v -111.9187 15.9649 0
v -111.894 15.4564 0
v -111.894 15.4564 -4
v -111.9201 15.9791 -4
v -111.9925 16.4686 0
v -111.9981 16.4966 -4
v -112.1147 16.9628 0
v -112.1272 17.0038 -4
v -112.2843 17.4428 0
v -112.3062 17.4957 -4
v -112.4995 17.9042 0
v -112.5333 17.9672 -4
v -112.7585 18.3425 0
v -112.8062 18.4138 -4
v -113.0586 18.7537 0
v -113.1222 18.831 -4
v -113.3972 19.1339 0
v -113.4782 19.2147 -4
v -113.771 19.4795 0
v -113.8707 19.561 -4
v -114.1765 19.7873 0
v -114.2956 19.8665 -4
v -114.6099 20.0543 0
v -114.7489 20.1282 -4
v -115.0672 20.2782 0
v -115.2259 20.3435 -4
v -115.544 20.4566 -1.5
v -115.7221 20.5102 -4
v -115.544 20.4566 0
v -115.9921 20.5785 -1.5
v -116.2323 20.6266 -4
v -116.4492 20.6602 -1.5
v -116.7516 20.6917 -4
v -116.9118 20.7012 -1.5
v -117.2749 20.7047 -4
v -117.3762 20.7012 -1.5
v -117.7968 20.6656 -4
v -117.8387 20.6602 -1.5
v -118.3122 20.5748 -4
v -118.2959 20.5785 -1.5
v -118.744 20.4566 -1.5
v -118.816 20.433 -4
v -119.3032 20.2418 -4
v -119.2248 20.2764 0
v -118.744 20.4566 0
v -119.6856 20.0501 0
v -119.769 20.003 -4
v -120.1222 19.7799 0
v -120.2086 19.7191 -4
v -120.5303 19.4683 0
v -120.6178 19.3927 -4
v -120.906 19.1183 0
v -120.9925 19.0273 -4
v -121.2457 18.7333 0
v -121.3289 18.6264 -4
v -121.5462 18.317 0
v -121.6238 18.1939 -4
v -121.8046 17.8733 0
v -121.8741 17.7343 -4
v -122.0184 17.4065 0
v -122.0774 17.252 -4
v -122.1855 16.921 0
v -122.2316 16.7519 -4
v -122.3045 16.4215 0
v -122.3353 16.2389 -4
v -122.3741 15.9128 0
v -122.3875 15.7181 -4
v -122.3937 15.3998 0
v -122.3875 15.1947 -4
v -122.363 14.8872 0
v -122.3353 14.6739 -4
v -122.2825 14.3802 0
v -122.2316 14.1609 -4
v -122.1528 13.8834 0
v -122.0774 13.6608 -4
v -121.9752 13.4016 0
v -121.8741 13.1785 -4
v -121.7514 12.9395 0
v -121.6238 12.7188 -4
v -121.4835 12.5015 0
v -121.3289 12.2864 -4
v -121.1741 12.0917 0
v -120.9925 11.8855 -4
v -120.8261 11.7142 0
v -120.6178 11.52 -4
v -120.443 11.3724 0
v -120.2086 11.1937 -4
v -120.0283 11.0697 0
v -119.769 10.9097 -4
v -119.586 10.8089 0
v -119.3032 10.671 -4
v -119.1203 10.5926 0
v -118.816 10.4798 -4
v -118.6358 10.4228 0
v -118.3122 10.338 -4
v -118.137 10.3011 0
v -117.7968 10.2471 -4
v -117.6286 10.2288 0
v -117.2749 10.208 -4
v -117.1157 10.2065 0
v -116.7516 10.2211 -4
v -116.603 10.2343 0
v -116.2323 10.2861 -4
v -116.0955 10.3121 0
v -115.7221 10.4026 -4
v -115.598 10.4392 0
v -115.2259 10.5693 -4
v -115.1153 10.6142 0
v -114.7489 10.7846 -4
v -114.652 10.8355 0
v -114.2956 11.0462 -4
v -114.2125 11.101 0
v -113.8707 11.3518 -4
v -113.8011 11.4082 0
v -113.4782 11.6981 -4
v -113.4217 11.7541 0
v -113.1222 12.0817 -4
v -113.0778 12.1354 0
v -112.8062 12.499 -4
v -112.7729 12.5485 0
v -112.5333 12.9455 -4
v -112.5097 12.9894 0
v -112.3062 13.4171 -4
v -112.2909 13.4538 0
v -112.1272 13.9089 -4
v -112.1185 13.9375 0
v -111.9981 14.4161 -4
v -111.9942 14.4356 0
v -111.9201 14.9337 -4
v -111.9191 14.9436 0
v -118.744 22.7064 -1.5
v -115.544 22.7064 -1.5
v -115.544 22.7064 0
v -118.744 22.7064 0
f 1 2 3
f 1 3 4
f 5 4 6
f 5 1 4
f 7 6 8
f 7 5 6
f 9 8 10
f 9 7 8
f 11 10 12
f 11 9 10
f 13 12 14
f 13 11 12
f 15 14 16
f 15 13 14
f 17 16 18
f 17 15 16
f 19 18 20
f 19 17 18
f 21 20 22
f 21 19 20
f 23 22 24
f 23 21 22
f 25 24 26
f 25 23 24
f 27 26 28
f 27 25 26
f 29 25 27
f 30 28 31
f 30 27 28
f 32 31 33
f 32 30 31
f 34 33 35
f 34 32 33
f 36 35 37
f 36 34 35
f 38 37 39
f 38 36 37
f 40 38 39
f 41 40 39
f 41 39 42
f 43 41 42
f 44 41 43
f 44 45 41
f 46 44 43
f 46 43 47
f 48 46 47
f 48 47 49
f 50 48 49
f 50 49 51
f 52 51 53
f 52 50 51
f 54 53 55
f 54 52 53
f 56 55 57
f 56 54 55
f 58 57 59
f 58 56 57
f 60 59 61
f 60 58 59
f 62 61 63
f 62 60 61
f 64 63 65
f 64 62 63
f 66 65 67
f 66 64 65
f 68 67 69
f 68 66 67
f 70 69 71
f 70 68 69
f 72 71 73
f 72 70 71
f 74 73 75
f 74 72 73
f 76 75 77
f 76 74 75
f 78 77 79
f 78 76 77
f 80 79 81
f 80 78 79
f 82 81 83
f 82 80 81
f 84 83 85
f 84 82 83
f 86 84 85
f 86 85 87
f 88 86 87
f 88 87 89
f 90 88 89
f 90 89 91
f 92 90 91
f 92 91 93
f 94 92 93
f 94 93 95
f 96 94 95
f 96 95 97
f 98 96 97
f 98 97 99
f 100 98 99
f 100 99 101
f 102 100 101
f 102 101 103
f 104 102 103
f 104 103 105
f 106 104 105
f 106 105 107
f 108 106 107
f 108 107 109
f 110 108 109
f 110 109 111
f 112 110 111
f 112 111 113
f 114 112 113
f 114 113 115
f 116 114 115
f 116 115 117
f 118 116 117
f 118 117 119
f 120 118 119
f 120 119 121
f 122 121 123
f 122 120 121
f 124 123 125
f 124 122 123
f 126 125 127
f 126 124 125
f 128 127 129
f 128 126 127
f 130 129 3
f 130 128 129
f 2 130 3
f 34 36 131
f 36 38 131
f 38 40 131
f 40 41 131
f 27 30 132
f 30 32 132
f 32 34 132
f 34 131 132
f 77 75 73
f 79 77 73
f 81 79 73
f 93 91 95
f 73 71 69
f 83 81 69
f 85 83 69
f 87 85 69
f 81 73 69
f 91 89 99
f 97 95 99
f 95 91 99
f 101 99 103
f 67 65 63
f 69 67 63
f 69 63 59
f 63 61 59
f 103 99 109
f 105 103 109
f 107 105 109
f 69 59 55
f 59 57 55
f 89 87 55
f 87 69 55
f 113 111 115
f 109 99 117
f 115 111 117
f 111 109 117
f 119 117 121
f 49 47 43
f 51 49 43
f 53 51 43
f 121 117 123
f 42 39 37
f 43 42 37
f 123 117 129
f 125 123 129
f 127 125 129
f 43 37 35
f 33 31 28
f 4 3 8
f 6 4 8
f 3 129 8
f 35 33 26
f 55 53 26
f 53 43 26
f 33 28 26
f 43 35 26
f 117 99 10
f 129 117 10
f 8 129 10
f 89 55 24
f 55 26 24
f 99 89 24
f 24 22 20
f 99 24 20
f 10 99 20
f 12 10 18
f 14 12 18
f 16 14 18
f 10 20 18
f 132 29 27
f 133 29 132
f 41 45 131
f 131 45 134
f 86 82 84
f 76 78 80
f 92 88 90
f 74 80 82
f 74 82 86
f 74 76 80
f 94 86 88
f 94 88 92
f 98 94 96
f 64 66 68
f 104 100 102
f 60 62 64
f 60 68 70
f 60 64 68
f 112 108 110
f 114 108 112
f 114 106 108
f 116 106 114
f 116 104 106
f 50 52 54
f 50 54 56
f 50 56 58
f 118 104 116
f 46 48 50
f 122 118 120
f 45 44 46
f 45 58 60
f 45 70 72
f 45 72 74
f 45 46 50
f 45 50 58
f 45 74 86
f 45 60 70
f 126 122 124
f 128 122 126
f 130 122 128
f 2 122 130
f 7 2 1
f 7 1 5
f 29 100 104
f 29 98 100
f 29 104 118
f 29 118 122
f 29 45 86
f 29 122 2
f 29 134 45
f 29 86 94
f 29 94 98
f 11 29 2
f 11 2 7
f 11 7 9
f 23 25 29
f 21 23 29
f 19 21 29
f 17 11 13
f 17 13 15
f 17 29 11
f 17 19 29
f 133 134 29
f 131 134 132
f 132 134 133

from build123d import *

# Parameters (mm, degrees)
SKIZZE1_R                       = 5.25
AUFSATZ_LINEAR_AUSTRAGEN1_DEPTH = 4
SKIZZE2_W                       = 3.2
SKIZZE2_H                       = 7.25
AUFSATZ_LINEAR_AUSTRAGEN2_DEPTH = 1.5


with BuildPart() as part:
    # Skizze1 → Aufsatz-Linear austragen1 (new body)
    with BuildSketch(Plane.XY):
        with Locations((-117.143982167, 15.456381225)):
            Circle(SKIZZE1_R)
    extrude(amount=-AUFSATZ_LINEAR_AUSTRAGEN1_DEPTH)

    # Skizze2 → Aufsatz-Linear austragen2 (add)
    with BuildSketch(Plane.XY):
        with Locations((-117.143982167, 19.081381225)):
            Rectangle(SKIZZE2_W, SKIZZE2_H)
    extrude(amount=-AUFSATZ_LINEAR_AUSTRAGEN2_DEPTH)


solid = part.part
